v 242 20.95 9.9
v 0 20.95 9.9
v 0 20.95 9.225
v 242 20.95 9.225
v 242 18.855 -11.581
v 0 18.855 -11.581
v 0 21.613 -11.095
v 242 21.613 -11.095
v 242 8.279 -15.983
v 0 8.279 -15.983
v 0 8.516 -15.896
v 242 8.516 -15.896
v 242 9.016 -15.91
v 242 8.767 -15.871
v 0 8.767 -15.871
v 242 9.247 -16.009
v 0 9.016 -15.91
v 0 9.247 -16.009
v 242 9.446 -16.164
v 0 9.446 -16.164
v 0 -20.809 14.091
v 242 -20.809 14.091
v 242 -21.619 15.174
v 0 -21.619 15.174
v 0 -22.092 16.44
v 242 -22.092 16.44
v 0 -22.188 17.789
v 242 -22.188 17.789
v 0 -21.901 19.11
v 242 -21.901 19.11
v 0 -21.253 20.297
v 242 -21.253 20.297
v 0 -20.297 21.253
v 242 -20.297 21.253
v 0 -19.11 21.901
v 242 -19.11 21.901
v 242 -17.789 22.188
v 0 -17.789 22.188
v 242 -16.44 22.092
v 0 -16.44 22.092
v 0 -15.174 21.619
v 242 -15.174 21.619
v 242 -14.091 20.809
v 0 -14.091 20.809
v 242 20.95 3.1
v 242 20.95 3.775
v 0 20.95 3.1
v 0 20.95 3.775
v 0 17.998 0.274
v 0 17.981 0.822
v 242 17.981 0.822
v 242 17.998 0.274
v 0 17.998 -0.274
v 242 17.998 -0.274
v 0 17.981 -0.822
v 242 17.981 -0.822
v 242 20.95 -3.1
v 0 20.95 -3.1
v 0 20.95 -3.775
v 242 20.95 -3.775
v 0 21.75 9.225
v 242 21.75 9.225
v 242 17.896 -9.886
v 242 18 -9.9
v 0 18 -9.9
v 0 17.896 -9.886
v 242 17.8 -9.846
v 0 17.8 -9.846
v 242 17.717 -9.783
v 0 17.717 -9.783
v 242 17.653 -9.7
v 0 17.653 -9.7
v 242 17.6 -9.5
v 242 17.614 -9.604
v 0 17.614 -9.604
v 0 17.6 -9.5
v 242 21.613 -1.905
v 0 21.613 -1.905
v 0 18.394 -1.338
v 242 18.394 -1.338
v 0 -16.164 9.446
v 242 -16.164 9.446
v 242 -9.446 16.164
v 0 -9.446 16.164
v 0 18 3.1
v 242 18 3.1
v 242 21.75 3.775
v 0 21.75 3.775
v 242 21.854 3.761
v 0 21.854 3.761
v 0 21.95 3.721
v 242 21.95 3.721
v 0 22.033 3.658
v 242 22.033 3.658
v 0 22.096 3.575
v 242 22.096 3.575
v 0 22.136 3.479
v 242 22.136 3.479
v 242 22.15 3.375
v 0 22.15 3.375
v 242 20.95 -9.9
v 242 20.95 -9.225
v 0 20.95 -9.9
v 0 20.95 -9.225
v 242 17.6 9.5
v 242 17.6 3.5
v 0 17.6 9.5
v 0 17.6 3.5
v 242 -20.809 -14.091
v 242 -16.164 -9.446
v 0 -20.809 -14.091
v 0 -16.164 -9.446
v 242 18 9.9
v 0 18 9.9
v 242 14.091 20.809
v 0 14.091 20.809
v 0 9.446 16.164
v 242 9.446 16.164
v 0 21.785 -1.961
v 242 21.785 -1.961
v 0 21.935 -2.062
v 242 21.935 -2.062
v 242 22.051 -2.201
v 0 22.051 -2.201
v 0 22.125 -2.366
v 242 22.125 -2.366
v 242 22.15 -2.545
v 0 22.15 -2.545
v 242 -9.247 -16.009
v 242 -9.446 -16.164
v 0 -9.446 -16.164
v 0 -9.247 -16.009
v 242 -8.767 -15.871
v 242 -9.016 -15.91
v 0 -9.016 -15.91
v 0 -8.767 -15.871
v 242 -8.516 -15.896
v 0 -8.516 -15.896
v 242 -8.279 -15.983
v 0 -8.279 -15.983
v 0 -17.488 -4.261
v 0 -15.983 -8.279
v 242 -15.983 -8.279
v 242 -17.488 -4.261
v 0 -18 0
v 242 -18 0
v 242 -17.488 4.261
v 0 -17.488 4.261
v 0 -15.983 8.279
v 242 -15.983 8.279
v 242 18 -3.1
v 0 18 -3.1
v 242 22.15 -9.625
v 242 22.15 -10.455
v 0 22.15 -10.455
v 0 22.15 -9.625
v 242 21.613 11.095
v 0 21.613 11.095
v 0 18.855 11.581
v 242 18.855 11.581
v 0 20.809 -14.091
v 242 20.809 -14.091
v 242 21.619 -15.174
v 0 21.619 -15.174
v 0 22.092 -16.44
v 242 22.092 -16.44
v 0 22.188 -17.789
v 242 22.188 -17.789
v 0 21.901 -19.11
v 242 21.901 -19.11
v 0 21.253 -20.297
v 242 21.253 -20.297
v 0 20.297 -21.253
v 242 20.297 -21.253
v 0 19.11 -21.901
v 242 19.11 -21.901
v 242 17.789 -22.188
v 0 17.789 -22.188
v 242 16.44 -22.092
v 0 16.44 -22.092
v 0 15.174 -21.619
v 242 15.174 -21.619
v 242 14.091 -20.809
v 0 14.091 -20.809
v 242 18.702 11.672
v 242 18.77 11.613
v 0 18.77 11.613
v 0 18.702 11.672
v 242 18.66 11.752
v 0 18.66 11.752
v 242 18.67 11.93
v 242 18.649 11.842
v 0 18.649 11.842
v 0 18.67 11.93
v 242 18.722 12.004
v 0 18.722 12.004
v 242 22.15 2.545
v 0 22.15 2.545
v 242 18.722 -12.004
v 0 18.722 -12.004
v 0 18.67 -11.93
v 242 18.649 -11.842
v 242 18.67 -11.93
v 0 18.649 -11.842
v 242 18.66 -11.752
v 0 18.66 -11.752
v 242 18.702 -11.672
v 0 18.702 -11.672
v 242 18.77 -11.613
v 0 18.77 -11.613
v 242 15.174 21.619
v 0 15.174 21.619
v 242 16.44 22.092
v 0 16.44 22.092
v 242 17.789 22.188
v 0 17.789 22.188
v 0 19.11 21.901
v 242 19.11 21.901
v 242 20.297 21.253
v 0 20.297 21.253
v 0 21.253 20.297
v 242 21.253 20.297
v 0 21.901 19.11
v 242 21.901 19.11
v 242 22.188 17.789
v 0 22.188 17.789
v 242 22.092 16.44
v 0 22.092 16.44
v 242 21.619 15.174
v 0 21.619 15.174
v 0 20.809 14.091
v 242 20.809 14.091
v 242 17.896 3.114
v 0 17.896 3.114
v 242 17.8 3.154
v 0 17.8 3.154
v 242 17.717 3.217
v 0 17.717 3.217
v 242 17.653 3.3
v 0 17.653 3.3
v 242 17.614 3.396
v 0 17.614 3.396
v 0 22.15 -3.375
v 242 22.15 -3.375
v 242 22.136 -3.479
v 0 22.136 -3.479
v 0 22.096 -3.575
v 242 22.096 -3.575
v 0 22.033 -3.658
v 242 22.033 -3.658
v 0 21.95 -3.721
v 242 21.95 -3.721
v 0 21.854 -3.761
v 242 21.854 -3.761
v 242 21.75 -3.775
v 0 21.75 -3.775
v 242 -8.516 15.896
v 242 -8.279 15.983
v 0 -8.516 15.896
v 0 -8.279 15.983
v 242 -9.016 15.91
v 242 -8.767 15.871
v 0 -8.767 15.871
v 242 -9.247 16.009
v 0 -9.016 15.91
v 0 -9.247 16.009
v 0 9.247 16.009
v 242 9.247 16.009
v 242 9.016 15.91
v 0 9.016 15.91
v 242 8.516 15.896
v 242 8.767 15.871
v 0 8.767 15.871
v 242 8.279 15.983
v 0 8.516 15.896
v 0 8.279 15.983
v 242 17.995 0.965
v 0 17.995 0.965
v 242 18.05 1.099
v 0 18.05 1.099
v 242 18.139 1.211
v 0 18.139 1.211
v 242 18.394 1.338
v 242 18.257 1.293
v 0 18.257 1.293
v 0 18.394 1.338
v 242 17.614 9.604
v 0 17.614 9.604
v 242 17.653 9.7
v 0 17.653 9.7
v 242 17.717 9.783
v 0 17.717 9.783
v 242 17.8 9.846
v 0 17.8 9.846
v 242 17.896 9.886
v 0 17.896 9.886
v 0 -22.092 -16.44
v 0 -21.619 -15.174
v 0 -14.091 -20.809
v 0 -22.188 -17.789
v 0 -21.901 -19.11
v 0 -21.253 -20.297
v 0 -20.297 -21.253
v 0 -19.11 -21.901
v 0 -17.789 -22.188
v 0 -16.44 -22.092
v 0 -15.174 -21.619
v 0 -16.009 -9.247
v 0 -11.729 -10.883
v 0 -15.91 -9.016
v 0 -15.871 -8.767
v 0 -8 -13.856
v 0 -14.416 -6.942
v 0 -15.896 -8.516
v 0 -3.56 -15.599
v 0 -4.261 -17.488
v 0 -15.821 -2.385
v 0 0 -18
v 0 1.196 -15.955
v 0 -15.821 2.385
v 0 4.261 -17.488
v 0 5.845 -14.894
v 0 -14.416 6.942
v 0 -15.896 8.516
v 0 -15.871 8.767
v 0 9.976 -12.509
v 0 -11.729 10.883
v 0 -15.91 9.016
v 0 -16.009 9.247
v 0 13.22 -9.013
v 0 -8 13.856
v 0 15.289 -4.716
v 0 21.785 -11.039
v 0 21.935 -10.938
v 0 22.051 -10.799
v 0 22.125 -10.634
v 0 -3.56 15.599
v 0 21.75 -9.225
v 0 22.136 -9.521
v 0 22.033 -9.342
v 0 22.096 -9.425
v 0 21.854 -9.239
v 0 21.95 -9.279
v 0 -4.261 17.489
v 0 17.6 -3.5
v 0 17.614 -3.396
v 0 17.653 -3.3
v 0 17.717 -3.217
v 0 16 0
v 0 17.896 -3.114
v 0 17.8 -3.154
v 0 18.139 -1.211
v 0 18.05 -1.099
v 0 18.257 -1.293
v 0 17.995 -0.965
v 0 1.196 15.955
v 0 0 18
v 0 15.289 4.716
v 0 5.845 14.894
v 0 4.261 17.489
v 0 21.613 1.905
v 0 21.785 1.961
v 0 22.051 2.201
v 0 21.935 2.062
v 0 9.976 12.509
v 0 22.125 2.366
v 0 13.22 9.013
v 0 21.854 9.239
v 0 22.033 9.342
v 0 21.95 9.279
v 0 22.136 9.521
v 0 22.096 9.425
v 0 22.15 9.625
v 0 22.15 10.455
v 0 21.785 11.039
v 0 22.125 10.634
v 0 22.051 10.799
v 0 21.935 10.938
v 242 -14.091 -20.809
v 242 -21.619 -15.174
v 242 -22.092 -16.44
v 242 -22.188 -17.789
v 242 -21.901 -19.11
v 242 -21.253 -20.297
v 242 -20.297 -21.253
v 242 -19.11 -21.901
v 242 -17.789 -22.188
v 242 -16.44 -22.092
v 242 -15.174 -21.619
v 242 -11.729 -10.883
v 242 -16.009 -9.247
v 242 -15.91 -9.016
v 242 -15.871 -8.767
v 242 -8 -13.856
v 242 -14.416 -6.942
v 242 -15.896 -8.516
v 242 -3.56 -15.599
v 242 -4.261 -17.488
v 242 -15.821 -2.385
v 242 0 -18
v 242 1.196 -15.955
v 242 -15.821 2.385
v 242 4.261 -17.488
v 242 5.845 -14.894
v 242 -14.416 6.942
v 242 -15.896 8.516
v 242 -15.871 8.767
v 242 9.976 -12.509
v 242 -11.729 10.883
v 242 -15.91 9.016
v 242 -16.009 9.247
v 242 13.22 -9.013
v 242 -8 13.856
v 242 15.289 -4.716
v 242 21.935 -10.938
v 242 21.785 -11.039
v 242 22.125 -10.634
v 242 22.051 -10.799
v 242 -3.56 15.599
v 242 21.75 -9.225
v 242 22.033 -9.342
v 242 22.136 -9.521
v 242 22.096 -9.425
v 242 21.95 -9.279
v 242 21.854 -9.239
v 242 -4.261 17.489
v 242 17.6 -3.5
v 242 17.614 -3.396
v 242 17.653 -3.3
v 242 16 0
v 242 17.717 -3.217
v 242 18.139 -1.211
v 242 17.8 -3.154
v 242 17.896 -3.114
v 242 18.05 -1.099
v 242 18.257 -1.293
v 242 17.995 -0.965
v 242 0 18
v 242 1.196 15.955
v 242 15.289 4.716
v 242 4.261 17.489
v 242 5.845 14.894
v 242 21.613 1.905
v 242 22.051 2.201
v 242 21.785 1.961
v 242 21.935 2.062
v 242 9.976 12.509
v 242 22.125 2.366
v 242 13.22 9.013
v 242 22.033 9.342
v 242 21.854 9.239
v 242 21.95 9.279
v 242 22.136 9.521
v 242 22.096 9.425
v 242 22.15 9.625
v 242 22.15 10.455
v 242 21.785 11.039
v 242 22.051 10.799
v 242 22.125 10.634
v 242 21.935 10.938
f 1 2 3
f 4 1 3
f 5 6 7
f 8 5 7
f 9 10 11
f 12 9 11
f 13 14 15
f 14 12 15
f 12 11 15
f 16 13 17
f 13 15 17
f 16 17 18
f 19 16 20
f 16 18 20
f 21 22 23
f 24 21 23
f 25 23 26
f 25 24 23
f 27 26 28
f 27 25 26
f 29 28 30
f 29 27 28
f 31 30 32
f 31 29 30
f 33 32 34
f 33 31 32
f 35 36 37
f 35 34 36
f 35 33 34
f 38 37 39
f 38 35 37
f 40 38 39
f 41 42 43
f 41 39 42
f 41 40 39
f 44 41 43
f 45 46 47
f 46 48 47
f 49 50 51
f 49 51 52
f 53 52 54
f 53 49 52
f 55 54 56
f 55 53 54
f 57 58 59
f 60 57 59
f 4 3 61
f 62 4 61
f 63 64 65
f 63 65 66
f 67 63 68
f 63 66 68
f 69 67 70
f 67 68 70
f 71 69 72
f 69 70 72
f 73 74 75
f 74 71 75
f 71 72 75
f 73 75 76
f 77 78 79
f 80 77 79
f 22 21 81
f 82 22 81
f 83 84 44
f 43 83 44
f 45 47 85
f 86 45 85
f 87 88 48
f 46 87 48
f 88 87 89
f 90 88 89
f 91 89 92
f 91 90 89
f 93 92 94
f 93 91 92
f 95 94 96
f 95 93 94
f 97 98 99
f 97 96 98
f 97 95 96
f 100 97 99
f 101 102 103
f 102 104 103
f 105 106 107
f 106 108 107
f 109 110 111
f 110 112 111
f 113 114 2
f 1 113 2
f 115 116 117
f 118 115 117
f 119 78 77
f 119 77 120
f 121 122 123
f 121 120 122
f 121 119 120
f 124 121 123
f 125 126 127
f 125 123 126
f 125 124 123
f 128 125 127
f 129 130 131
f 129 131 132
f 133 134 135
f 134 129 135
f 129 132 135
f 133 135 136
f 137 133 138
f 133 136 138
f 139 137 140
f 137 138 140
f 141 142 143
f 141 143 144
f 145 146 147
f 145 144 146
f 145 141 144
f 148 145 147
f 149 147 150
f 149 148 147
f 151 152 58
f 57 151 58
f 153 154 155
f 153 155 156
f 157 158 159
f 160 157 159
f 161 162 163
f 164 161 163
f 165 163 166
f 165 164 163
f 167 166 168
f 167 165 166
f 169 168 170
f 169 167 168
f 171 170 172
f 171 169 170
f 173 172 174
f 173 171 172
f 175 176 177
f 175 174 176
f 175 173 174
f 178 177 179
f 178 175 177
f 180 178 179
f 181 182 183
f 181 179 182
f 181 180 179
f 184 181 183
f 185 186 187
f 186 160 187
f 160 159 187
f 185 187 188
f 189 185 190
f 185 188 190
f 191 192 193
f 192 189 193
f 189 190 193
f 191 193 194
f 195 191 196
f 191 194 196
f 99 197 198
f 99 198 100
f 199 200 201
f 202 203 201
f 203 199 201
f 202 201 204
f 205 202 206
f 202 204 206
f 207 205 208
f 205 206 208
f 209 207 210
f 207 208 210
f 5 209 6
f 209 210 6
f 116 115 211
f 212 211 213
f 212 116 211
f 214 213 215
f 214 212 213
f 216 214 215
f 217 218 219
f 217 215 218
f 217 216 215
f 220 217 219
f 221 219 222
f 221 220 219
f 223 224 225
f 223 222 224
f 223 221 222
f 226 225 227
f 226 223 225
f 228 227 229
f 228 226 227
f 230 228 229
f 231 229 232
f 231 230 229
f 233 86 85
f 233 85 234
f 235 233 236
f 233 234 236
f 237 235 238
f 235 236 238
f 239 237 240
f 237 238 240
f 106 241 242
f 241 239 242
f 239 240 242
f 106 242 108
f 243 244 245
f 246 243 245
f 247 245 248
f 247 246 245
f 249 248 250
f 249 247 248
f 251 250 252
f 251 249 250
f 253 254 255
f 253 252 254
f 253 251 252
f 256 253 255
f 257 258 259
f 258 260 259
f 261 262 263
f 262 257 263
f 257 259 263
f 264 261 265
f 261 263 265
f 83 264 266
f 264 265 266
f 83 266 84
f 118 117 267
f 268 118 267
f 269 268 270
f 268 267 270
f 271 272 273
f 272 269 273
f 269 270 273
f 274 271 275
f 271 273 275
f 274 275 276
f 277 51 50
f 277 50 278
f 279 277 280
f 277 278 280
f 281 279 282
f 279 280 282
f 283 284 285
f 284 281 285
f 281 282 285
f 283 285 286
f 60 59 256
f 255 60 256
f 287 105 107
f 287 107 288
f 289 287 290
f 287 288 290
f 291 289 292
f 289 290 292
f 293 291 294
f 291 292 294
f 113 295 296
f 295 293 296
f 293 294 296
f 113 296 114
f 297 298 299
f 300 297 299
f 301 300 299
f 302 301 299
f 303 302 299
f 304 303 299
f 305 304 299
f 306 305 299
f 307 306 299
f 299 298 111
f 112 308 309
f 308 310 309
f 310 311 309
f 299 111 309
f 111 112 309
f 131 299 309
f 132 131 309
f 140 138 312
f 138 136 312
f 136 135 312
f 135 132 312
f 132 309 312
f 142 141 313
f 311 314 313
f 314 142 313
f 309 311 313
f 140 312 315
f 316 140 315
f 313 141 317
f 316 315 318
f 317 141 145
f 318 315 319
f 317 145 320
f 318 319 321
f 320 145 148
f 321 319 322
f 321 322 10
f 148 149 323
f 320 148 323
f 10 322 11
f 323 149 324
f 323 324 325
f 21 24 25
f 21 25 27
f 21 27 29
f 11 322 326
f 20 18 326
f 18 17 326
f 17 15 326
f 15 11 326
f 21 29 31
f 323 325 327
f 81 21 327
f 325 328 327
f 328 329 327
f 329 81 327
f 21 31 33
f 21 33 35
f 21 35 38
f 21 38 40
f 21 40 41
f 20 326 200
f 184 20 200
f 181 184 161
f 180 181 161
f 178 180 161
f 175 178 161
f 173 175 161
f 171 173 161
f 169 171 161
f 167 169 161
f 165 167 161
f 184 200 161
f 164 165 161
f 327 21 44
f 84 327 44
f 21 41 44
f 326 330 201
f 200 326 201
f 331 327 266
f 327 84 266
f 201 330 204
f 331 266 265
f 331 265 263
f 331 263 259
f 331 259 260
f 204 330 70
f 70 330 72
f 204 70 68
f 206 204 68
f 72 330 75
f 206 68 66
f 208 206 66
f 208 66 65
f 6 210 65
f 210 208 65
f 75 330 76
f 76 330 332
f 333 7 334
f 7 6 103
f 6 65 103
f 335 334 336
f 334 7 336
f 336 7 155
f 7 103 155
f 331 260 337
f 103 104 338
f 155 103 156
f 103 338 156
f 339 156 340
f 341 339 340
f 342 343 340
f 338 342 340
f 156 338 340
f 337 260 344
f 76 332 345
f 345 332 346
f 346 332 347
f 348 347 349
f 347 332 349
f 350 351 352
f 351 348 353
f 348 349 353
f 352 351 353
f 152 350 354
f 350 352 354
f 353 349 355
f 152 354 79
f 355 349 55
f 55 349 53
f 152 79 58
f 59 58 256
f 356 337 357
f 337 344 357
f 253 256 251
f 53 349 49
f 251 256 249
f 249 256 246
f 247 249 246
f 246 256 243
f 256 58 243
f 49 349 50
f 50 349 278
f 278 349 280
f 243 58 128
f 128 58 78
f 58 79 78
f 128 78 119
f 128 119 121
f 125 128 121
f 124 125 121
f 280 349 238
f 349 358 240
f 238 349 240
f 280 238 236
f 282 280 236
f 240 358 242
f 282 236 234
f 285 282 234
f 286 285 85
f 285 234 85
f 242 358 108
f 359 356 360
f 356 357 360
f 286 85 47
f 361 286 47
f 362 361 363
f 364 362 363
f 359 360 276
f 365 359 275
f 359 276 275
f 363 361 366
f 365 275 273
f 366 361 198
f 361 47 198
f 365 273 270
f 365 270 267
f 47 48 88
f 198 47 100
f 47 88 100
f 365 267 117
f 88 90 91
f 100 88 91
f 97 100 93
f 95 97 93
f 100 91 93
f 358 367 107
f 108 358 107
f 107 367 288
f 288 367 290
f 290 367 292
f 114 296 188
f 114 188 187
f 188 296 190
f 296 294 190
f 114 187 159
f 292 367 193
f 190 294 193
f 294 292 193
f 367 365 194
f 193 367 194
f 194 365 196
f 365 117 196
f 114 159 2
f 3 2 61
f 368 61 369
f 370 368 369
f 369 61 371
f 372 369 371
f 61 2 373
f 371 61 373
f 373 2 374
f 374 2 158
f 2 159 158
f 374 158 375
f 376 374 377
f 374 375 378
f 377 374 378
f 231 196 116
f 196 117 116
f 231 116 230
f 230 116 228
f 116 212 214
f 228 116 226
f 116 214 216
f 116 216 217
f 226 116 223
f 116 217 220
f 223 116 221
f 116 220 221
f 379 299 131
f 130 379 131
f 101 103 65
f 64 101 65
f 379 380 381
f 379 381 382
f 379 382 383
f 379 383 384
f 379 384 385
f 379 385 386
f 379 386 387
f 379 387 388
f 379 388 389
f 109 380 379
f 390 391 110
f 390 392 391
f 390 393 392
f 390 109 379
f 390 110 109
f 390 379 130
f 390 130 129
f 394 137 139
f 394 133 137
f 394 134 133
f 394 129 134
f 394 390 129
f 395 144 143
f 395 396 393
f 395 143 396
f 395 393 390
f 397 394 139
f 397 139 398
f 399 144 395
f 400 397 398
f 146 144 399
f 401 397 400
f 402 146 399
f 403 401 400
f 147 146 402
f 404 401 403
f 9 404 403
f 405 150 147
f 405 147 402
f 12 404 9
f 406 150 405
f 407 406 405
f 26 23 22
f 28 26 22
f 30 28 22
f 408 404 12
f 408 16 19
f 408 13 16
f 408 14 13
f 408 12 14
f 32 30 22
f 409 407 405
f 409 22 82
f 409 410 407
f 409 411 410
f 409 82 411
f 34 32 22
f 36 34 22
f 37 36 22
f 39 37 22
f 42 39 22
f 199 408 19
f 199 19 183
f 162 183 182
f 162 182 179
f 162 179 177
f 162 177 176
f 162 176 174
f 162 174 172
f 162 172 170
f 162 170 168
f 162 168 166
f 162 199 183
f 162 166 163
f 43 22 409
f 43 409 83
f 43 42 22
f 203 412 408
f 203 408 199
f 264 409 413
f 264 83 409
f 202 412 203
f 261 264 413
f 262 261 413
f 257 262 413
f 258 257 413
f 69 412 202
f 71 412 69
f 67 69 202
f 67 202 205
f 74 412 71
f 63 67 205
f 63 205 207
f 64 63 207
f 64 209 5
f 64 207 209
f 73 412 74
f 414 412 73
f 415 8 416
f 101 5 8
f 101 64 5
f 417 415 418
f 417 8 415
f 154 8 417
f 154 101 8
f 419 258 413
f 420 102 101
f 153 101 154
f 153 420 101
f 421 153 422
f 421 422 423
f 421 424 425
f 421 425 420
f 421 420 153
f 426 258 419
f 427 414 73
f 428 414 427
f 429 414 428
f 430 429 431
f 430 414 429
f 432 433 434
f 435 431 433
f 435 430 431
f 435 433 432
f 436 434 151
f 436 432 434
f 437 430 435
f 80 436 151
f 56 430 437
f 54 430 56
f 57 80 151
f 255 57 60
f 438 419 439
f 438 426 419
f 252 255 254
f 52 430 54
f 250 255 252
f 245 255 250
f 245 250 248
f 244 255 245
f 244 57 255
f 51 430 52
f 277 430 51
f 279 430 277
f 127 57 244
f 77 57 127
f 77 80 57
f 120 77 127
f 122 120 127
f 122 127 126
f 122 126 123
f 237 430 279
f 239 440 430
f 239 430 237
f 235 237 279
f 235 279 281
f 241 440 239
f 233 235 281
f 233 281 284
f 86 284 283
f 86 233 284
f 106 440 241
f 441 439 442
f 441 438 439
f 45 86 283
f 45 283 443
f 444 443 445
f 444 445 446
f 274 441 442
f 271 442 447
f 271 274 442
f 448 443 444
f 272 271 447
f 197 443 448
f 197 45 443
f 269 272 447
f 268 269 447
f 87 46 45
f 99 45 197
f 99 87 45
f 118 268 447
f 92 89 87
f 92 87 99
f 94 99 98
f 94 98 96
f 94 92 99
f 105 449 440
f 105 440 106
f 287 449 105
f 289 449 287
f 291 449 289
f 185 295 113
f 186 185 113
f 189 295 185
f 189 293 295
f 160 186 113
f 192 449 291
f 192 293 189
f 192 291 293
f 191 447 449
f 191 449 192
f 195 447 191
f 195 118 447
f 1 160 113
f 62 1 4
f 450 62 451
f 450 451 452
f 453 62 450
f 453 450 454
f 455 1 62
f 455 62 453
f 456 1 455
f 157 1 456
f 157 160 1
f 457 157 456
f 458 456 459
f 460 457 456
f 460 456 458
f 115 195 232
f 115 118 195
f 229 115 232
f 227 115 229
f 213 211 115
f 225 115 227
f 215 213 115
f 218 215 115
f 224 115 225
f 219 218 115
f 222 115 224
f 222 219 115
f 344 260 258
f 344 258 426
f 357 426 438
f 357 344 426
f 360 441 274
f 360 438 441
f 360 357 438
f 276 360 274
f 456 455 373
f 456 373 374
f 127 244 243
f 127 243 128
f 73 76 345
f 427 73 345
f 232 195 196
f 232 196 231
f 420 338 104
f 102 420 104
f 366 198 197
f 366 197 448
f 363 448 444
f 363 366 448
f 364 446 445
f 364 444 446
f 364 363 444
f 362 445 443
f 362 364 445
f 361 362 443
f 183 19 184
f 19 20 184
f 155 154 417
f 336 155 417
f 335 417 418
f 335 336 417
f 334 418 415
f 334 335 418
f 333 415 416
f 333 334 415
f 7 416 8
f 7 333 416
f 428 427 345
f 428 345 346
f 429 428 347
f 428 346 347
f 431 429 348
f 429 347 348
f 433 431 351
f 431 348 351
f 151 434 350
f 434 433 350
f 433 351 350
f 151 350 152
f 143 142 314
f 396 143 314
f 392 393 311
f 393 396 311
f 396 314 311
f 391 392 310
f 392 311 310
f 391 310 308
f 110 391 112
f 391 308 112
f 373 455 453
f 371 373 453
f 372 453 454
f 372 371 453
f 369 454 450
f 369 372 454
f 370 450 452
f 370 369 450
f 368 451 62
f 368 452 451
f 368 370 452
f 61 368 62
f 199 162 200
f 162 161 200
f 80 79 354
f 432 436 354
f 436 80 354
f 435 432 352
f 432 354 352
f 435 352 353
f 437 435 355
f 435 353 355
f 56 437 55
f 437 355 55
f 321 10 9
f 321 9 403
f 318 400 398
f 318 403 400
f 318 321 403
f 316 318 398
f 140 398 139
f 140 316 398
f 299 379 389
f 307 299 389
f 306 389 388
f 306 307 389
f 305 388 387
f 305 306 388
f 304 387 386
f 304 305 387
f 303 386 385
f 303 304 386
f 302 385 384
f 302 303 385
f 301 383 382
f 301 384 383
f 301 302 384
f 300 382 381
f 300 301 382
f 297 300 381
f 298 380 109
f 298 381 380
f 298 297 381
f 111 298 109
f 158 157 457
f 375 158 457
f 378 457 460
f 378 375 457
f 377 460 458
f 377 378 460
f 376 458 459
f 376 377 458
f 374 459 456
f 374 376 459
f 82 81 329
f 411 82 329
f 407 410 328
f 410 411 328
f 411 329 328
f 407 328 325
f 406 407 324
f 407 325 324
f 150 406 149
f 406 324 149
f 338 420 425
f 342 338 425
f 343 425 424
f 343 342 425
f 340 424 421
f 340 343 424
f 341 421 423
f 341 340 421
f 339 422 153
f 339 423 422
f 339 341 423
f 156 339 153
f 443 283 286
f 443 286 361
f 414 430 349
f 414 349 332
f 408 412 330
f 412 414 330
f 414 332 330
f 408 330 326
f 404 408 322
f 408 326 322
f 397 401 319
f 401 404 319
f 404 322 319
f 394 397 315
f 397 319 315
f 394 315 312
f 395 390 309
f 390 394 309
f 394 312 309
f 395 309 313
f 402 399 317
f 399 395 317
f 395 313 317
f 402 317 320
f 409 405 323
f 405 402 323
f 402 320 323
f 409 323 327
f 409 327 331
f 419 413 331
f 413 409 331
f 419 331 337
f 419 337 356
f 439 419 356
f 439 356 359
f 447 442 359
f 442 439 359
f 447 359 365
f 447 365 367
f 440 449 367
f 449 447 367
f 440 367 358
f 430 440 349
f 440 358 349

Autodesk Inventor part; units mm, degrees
sketch "Sketch_1" plane through (0, 0, 0) normal (1, 0, 0) x (0, 1, 0)
  arc A0 (-14.0912, 20.8088) -> (-20.8088, 14.0912) centre (-17.45, 17.45) ccw
  line L0 (-20.8088, 14.0912) -> (-16.1638, 9.4463)
  arc A1 (-15.9829, 8.2792) -> (-16.1638, 9.4463) centre (-16.8709, 8.7392) ccw
  arc A2 (-15.9829, 8.2792) -> (-15.983, -8.2792) centre (0, 0) ccw
  arc A3 (-16.1638, -9.4463) -> (-15.983, -8.2792) centre (-16.8709, -8.7392) ccw
  line L1 (-16.1638, -9.4463) -> (-20.8088, -14.0912)
  arc A4 (-20.8088, -14.0912) -> (-14.0912, -20.8088) centre (-17.45, -17.45) ccw
  line L2 (-14.0912, -20.8088) -> (-9.4463, -16.1638)
  arc A5 (-8.2792, -15.9829) -> (-9.4463, -16.1638) centre (-8.7392, -16.8709) ccw
  arc A6 (-8.2792, -15.9829) -> (8.2792, -15.983) centre (0, 0) ccw
  arc A7 (9.4463, -16.1638) -> (8.2792, -15.983) centre (8.7392, -16.8709) ccw
  line L3 (9.4463, -16.1638) -> (14.0912, -20.8088)
  arc A8 (14.0912, -20.8088) -> (20.8088, -14.0912) centre (17.45, -17.45) ccw
  line L4 (20.8088, -14.0912) -> (18.7215, -12.004)
  arc A9 (18.8549, -11.581) -> (18.7215, -12.004) centre (18.8983, -11.8272) ccw
  line L5 (18.8549, -11.581) -> (21.6129, -11.0947)
  arc A10 (21.6129, -11.0947) -> (22.15, -10.4546) centre (21.5, -10.4546) ccw
  line L6 (22.15, -10.4546) -> (22.15, -9.625)
  arc A11 (22.15, -9.625) -> (21.75, -9.225) centre (21.75, -9.625) ccw
  line L7 (21.75, -9.225) -> (20.9499, -9.225)
  line L8 (20.9499, -9.225) -> (20.9499, -9.9)
  line L9 (20.9499, -9.9) -> (17.9999, -9.9)
  arc A12 (17.5999, -9.5) -> (17.9999, -9.9) centre (17.9999, -9.5) ccw
  line L10 (17.5999, -9.5) -> (17.5999, -3.5)
  arc A13 (17.9999, -3.1) -> (17.5999, -3.5) centre (17.9999, -3.5) ccw
  line L11 (17.9999, -3.1) -> (20.9499, -3.1)
  line L12 (20.9499, -3.1) -> (20.9499, -3.775)
  line L13 (20.9499, -3.775) -> (21.75, -3.775)
  arc A14 (21.75, -3.775) -> (22.15, -3.375) centre (21.75, -3.375) ccw
  line L14 (22.15, -3.375) -> (22.15, -2.5454)
  arc A15 (22.15, -2.5454) -> (21.6129, -1.9053) centre (21.5, -2.5454) ccw
  line L15 (21.6129, -1.9053) -> (18.3939, -1.3377)
  arc A16 (17.9812, -0.8224) -> (18.3939, -1.3377) centre (18.4807, -0.8453) ccw
  arc A17 (17.9812, -0.8224) -> (17.9812, 0.8224) centre (0, 0) ccw
  arc A18 (18.3939, 1.3377) -> (17.9812, 0.8224) centre (18.4807, 0.8453) ccw
  line L16 (18.3939, 1.3377) -> (21.6129, 1.9053)
  arc A19 (21.6129, 1.9053) -> (22.15, 2.5454) centre (21.5, 2.5454) ccw
  line L17 (22.15, 2.5454) -> (22.15, 3.375)
  arc A20 (22.15, 3.375) -> (21.75, 3.775) centre (21.75, 3.375) ccw
  line L18 (21.75, 3.775) -> (20.9499, 3.775)
  line L19 (20.9499, 3.775) -> (20.9499, 3.1)
  line L20 (20.9499, 3.1) -> (17.9999, 3.1)
  arc A21 (17.5999, 3.5) -> (17.9999, 3.1) centre (17.9999, 3.5) ccw
  line L21 (17.5999, 3.5) -> (17.5999, 9.5)
  arc A22 (17.9999, 9.9) -> (17.5999, 9.5) centre (17.9999, 9.5) ccw
  line L22 (17.9999, 9.9) -> (20.9499, 9.9)
  line L23 (20.9499, 9.9) -> (20.9499, 9.225)
  line L24 (20.9499, 9.225) -> (21.75, 9.225)
  arc A23 (21.75, 9.225) -> (22.15, 9.625) centre (21.75, 9.625) ccw
  line L25 (22.15, 9.625) -> (22.15, 10.4546)
  arc A24 (22.15, 10.4546) -> (21.6129, 11.0947) centre (21.5, 10.4546) ccw
  line L26 (21.6129, 11.0947) -> (18.8549, 11.581)
  arc A25 (18.7215, 12.004) -> (18.8549, 11.581) centre (18.8983, 11.8272) ccw
  line L27 (18.7215, 12.004) -> (20.8088, 14.0912)
  arc A26 (20.8088, 14.0912) -> (14.0912, 20.8088) centre (17.45, 17.45) ccw
  line L28 (14.0912, 20.8088) -> (9.4463, 16.1638)
  arc A27 (8.2792, 15.983) -> (9.4463, 16.1638) centre (8.7392, 16.8709) ccw
  arc A28 (8.2792, 15.983) -> (-8.2792, 15.983) centre (0, 0) ccw
  arc A29 (-9.4463, 16.1638) -> (-8.2792, 15.983) centre (-8.7392, 16.8709) ccw
  line L29 (-9.4463, 16.1638) -> (-14.0912, 20.8088)
  circle A30 centre (0, 0) radius 16
extrude "Extrusion1" add sketch "Sketch_1" along normal blind 242
ref_plane "br_l_XY" through (0, 0, 0) normal (1, 0, 0) x (0, 0, -1)
ref_plane "br_l_YZ" through (0, 0, 0) normal (0, 0, -1) x (0, 1, 0)
ref_plane "br_l_ZX" through (0, 0, 0) normal (0, 1, 0) x (1, 0, 0)
ref_plane "br_r_XY" through (242, 0, 0) normal (-1, 0, 0) x (0, 0, -1)
ref_plane "br_r_YZ" through (242, 0, 0) normal (0, 0, -1) x (0, -1, 0)
ref_plane "br_r_ZX" through (242, 0, 0) normal (0, -1, 0) x (-1, 0, 0)
ref_plane "mod_en_XY" through (121, 0, 0) normal (1, 0, 0) x (0, 0, -1)
ref_plane "mod_en_YZ" through (121, 0, 0) normal (0, 0, -1) x (0, 1, 0)
ref_plane "mod_en_ZX" through (121, 0, 0) normal (0, 1, 0) x (1, 0, 0)
ref_plane "sens_sqr_l_XY" through (0, 17.6, -6.5) normal (-1, 0, 0) x (0, 0, -1)
ref_plane "sens_sqr_l_YZ" through (0, 17.6, -6.5) normal (0, 0, -1) x (0, -1, 0)
ref_plane "sens_sqr_l_ZX" through (0, 17.6, -6.5) normal (0, -1, 0) x (-1, 0, 0)
ref_plane "sens_sqr_r_XY" through (242, 17.6, 6.5) normal (1, 0, 0) x (0, 0, -1)
ref_plane "sens_sqr_r_YZ" through (242, 17.6, 6.5) normal (0, 0, -1) x (0, 1, 0)
ref_plane "sens_sqr_r_ZX" through (242, 17.6, 6.5) normal (0, 1, 0) x (1, 0, 0)
ref_plane "sensor_l_XY" through (2.7, 19.65, -6.5) normal (0, -1, 0) x (1, 0, 0)
ref_plane "sensor_l_YZ" through (2.7, 19.65, -6.5) normal (1, 0, 0) x (0, 0, 1)
ref_plane "sensor_l_ZX" through (2.7, 19.65, -6.5) normal (0, 0, 1) x (0, -1, 0)
ref_plane "sensor_r_XY" through (239.3, 19.65, 6.5) normal (0, -1, 0) x (1, 0, 0)
ref_plane "sensor_r_YZ" through (239.3, 19.65, 6.5) normal (1, 0, 0) x (0, 0, 1)
ref_plane "sensor_r_ZX" through (239.3, 19.65, 6.5) normal (0, 0, 1) x (0, -1, 0)
properties part number "32-121-200--173-s3"
